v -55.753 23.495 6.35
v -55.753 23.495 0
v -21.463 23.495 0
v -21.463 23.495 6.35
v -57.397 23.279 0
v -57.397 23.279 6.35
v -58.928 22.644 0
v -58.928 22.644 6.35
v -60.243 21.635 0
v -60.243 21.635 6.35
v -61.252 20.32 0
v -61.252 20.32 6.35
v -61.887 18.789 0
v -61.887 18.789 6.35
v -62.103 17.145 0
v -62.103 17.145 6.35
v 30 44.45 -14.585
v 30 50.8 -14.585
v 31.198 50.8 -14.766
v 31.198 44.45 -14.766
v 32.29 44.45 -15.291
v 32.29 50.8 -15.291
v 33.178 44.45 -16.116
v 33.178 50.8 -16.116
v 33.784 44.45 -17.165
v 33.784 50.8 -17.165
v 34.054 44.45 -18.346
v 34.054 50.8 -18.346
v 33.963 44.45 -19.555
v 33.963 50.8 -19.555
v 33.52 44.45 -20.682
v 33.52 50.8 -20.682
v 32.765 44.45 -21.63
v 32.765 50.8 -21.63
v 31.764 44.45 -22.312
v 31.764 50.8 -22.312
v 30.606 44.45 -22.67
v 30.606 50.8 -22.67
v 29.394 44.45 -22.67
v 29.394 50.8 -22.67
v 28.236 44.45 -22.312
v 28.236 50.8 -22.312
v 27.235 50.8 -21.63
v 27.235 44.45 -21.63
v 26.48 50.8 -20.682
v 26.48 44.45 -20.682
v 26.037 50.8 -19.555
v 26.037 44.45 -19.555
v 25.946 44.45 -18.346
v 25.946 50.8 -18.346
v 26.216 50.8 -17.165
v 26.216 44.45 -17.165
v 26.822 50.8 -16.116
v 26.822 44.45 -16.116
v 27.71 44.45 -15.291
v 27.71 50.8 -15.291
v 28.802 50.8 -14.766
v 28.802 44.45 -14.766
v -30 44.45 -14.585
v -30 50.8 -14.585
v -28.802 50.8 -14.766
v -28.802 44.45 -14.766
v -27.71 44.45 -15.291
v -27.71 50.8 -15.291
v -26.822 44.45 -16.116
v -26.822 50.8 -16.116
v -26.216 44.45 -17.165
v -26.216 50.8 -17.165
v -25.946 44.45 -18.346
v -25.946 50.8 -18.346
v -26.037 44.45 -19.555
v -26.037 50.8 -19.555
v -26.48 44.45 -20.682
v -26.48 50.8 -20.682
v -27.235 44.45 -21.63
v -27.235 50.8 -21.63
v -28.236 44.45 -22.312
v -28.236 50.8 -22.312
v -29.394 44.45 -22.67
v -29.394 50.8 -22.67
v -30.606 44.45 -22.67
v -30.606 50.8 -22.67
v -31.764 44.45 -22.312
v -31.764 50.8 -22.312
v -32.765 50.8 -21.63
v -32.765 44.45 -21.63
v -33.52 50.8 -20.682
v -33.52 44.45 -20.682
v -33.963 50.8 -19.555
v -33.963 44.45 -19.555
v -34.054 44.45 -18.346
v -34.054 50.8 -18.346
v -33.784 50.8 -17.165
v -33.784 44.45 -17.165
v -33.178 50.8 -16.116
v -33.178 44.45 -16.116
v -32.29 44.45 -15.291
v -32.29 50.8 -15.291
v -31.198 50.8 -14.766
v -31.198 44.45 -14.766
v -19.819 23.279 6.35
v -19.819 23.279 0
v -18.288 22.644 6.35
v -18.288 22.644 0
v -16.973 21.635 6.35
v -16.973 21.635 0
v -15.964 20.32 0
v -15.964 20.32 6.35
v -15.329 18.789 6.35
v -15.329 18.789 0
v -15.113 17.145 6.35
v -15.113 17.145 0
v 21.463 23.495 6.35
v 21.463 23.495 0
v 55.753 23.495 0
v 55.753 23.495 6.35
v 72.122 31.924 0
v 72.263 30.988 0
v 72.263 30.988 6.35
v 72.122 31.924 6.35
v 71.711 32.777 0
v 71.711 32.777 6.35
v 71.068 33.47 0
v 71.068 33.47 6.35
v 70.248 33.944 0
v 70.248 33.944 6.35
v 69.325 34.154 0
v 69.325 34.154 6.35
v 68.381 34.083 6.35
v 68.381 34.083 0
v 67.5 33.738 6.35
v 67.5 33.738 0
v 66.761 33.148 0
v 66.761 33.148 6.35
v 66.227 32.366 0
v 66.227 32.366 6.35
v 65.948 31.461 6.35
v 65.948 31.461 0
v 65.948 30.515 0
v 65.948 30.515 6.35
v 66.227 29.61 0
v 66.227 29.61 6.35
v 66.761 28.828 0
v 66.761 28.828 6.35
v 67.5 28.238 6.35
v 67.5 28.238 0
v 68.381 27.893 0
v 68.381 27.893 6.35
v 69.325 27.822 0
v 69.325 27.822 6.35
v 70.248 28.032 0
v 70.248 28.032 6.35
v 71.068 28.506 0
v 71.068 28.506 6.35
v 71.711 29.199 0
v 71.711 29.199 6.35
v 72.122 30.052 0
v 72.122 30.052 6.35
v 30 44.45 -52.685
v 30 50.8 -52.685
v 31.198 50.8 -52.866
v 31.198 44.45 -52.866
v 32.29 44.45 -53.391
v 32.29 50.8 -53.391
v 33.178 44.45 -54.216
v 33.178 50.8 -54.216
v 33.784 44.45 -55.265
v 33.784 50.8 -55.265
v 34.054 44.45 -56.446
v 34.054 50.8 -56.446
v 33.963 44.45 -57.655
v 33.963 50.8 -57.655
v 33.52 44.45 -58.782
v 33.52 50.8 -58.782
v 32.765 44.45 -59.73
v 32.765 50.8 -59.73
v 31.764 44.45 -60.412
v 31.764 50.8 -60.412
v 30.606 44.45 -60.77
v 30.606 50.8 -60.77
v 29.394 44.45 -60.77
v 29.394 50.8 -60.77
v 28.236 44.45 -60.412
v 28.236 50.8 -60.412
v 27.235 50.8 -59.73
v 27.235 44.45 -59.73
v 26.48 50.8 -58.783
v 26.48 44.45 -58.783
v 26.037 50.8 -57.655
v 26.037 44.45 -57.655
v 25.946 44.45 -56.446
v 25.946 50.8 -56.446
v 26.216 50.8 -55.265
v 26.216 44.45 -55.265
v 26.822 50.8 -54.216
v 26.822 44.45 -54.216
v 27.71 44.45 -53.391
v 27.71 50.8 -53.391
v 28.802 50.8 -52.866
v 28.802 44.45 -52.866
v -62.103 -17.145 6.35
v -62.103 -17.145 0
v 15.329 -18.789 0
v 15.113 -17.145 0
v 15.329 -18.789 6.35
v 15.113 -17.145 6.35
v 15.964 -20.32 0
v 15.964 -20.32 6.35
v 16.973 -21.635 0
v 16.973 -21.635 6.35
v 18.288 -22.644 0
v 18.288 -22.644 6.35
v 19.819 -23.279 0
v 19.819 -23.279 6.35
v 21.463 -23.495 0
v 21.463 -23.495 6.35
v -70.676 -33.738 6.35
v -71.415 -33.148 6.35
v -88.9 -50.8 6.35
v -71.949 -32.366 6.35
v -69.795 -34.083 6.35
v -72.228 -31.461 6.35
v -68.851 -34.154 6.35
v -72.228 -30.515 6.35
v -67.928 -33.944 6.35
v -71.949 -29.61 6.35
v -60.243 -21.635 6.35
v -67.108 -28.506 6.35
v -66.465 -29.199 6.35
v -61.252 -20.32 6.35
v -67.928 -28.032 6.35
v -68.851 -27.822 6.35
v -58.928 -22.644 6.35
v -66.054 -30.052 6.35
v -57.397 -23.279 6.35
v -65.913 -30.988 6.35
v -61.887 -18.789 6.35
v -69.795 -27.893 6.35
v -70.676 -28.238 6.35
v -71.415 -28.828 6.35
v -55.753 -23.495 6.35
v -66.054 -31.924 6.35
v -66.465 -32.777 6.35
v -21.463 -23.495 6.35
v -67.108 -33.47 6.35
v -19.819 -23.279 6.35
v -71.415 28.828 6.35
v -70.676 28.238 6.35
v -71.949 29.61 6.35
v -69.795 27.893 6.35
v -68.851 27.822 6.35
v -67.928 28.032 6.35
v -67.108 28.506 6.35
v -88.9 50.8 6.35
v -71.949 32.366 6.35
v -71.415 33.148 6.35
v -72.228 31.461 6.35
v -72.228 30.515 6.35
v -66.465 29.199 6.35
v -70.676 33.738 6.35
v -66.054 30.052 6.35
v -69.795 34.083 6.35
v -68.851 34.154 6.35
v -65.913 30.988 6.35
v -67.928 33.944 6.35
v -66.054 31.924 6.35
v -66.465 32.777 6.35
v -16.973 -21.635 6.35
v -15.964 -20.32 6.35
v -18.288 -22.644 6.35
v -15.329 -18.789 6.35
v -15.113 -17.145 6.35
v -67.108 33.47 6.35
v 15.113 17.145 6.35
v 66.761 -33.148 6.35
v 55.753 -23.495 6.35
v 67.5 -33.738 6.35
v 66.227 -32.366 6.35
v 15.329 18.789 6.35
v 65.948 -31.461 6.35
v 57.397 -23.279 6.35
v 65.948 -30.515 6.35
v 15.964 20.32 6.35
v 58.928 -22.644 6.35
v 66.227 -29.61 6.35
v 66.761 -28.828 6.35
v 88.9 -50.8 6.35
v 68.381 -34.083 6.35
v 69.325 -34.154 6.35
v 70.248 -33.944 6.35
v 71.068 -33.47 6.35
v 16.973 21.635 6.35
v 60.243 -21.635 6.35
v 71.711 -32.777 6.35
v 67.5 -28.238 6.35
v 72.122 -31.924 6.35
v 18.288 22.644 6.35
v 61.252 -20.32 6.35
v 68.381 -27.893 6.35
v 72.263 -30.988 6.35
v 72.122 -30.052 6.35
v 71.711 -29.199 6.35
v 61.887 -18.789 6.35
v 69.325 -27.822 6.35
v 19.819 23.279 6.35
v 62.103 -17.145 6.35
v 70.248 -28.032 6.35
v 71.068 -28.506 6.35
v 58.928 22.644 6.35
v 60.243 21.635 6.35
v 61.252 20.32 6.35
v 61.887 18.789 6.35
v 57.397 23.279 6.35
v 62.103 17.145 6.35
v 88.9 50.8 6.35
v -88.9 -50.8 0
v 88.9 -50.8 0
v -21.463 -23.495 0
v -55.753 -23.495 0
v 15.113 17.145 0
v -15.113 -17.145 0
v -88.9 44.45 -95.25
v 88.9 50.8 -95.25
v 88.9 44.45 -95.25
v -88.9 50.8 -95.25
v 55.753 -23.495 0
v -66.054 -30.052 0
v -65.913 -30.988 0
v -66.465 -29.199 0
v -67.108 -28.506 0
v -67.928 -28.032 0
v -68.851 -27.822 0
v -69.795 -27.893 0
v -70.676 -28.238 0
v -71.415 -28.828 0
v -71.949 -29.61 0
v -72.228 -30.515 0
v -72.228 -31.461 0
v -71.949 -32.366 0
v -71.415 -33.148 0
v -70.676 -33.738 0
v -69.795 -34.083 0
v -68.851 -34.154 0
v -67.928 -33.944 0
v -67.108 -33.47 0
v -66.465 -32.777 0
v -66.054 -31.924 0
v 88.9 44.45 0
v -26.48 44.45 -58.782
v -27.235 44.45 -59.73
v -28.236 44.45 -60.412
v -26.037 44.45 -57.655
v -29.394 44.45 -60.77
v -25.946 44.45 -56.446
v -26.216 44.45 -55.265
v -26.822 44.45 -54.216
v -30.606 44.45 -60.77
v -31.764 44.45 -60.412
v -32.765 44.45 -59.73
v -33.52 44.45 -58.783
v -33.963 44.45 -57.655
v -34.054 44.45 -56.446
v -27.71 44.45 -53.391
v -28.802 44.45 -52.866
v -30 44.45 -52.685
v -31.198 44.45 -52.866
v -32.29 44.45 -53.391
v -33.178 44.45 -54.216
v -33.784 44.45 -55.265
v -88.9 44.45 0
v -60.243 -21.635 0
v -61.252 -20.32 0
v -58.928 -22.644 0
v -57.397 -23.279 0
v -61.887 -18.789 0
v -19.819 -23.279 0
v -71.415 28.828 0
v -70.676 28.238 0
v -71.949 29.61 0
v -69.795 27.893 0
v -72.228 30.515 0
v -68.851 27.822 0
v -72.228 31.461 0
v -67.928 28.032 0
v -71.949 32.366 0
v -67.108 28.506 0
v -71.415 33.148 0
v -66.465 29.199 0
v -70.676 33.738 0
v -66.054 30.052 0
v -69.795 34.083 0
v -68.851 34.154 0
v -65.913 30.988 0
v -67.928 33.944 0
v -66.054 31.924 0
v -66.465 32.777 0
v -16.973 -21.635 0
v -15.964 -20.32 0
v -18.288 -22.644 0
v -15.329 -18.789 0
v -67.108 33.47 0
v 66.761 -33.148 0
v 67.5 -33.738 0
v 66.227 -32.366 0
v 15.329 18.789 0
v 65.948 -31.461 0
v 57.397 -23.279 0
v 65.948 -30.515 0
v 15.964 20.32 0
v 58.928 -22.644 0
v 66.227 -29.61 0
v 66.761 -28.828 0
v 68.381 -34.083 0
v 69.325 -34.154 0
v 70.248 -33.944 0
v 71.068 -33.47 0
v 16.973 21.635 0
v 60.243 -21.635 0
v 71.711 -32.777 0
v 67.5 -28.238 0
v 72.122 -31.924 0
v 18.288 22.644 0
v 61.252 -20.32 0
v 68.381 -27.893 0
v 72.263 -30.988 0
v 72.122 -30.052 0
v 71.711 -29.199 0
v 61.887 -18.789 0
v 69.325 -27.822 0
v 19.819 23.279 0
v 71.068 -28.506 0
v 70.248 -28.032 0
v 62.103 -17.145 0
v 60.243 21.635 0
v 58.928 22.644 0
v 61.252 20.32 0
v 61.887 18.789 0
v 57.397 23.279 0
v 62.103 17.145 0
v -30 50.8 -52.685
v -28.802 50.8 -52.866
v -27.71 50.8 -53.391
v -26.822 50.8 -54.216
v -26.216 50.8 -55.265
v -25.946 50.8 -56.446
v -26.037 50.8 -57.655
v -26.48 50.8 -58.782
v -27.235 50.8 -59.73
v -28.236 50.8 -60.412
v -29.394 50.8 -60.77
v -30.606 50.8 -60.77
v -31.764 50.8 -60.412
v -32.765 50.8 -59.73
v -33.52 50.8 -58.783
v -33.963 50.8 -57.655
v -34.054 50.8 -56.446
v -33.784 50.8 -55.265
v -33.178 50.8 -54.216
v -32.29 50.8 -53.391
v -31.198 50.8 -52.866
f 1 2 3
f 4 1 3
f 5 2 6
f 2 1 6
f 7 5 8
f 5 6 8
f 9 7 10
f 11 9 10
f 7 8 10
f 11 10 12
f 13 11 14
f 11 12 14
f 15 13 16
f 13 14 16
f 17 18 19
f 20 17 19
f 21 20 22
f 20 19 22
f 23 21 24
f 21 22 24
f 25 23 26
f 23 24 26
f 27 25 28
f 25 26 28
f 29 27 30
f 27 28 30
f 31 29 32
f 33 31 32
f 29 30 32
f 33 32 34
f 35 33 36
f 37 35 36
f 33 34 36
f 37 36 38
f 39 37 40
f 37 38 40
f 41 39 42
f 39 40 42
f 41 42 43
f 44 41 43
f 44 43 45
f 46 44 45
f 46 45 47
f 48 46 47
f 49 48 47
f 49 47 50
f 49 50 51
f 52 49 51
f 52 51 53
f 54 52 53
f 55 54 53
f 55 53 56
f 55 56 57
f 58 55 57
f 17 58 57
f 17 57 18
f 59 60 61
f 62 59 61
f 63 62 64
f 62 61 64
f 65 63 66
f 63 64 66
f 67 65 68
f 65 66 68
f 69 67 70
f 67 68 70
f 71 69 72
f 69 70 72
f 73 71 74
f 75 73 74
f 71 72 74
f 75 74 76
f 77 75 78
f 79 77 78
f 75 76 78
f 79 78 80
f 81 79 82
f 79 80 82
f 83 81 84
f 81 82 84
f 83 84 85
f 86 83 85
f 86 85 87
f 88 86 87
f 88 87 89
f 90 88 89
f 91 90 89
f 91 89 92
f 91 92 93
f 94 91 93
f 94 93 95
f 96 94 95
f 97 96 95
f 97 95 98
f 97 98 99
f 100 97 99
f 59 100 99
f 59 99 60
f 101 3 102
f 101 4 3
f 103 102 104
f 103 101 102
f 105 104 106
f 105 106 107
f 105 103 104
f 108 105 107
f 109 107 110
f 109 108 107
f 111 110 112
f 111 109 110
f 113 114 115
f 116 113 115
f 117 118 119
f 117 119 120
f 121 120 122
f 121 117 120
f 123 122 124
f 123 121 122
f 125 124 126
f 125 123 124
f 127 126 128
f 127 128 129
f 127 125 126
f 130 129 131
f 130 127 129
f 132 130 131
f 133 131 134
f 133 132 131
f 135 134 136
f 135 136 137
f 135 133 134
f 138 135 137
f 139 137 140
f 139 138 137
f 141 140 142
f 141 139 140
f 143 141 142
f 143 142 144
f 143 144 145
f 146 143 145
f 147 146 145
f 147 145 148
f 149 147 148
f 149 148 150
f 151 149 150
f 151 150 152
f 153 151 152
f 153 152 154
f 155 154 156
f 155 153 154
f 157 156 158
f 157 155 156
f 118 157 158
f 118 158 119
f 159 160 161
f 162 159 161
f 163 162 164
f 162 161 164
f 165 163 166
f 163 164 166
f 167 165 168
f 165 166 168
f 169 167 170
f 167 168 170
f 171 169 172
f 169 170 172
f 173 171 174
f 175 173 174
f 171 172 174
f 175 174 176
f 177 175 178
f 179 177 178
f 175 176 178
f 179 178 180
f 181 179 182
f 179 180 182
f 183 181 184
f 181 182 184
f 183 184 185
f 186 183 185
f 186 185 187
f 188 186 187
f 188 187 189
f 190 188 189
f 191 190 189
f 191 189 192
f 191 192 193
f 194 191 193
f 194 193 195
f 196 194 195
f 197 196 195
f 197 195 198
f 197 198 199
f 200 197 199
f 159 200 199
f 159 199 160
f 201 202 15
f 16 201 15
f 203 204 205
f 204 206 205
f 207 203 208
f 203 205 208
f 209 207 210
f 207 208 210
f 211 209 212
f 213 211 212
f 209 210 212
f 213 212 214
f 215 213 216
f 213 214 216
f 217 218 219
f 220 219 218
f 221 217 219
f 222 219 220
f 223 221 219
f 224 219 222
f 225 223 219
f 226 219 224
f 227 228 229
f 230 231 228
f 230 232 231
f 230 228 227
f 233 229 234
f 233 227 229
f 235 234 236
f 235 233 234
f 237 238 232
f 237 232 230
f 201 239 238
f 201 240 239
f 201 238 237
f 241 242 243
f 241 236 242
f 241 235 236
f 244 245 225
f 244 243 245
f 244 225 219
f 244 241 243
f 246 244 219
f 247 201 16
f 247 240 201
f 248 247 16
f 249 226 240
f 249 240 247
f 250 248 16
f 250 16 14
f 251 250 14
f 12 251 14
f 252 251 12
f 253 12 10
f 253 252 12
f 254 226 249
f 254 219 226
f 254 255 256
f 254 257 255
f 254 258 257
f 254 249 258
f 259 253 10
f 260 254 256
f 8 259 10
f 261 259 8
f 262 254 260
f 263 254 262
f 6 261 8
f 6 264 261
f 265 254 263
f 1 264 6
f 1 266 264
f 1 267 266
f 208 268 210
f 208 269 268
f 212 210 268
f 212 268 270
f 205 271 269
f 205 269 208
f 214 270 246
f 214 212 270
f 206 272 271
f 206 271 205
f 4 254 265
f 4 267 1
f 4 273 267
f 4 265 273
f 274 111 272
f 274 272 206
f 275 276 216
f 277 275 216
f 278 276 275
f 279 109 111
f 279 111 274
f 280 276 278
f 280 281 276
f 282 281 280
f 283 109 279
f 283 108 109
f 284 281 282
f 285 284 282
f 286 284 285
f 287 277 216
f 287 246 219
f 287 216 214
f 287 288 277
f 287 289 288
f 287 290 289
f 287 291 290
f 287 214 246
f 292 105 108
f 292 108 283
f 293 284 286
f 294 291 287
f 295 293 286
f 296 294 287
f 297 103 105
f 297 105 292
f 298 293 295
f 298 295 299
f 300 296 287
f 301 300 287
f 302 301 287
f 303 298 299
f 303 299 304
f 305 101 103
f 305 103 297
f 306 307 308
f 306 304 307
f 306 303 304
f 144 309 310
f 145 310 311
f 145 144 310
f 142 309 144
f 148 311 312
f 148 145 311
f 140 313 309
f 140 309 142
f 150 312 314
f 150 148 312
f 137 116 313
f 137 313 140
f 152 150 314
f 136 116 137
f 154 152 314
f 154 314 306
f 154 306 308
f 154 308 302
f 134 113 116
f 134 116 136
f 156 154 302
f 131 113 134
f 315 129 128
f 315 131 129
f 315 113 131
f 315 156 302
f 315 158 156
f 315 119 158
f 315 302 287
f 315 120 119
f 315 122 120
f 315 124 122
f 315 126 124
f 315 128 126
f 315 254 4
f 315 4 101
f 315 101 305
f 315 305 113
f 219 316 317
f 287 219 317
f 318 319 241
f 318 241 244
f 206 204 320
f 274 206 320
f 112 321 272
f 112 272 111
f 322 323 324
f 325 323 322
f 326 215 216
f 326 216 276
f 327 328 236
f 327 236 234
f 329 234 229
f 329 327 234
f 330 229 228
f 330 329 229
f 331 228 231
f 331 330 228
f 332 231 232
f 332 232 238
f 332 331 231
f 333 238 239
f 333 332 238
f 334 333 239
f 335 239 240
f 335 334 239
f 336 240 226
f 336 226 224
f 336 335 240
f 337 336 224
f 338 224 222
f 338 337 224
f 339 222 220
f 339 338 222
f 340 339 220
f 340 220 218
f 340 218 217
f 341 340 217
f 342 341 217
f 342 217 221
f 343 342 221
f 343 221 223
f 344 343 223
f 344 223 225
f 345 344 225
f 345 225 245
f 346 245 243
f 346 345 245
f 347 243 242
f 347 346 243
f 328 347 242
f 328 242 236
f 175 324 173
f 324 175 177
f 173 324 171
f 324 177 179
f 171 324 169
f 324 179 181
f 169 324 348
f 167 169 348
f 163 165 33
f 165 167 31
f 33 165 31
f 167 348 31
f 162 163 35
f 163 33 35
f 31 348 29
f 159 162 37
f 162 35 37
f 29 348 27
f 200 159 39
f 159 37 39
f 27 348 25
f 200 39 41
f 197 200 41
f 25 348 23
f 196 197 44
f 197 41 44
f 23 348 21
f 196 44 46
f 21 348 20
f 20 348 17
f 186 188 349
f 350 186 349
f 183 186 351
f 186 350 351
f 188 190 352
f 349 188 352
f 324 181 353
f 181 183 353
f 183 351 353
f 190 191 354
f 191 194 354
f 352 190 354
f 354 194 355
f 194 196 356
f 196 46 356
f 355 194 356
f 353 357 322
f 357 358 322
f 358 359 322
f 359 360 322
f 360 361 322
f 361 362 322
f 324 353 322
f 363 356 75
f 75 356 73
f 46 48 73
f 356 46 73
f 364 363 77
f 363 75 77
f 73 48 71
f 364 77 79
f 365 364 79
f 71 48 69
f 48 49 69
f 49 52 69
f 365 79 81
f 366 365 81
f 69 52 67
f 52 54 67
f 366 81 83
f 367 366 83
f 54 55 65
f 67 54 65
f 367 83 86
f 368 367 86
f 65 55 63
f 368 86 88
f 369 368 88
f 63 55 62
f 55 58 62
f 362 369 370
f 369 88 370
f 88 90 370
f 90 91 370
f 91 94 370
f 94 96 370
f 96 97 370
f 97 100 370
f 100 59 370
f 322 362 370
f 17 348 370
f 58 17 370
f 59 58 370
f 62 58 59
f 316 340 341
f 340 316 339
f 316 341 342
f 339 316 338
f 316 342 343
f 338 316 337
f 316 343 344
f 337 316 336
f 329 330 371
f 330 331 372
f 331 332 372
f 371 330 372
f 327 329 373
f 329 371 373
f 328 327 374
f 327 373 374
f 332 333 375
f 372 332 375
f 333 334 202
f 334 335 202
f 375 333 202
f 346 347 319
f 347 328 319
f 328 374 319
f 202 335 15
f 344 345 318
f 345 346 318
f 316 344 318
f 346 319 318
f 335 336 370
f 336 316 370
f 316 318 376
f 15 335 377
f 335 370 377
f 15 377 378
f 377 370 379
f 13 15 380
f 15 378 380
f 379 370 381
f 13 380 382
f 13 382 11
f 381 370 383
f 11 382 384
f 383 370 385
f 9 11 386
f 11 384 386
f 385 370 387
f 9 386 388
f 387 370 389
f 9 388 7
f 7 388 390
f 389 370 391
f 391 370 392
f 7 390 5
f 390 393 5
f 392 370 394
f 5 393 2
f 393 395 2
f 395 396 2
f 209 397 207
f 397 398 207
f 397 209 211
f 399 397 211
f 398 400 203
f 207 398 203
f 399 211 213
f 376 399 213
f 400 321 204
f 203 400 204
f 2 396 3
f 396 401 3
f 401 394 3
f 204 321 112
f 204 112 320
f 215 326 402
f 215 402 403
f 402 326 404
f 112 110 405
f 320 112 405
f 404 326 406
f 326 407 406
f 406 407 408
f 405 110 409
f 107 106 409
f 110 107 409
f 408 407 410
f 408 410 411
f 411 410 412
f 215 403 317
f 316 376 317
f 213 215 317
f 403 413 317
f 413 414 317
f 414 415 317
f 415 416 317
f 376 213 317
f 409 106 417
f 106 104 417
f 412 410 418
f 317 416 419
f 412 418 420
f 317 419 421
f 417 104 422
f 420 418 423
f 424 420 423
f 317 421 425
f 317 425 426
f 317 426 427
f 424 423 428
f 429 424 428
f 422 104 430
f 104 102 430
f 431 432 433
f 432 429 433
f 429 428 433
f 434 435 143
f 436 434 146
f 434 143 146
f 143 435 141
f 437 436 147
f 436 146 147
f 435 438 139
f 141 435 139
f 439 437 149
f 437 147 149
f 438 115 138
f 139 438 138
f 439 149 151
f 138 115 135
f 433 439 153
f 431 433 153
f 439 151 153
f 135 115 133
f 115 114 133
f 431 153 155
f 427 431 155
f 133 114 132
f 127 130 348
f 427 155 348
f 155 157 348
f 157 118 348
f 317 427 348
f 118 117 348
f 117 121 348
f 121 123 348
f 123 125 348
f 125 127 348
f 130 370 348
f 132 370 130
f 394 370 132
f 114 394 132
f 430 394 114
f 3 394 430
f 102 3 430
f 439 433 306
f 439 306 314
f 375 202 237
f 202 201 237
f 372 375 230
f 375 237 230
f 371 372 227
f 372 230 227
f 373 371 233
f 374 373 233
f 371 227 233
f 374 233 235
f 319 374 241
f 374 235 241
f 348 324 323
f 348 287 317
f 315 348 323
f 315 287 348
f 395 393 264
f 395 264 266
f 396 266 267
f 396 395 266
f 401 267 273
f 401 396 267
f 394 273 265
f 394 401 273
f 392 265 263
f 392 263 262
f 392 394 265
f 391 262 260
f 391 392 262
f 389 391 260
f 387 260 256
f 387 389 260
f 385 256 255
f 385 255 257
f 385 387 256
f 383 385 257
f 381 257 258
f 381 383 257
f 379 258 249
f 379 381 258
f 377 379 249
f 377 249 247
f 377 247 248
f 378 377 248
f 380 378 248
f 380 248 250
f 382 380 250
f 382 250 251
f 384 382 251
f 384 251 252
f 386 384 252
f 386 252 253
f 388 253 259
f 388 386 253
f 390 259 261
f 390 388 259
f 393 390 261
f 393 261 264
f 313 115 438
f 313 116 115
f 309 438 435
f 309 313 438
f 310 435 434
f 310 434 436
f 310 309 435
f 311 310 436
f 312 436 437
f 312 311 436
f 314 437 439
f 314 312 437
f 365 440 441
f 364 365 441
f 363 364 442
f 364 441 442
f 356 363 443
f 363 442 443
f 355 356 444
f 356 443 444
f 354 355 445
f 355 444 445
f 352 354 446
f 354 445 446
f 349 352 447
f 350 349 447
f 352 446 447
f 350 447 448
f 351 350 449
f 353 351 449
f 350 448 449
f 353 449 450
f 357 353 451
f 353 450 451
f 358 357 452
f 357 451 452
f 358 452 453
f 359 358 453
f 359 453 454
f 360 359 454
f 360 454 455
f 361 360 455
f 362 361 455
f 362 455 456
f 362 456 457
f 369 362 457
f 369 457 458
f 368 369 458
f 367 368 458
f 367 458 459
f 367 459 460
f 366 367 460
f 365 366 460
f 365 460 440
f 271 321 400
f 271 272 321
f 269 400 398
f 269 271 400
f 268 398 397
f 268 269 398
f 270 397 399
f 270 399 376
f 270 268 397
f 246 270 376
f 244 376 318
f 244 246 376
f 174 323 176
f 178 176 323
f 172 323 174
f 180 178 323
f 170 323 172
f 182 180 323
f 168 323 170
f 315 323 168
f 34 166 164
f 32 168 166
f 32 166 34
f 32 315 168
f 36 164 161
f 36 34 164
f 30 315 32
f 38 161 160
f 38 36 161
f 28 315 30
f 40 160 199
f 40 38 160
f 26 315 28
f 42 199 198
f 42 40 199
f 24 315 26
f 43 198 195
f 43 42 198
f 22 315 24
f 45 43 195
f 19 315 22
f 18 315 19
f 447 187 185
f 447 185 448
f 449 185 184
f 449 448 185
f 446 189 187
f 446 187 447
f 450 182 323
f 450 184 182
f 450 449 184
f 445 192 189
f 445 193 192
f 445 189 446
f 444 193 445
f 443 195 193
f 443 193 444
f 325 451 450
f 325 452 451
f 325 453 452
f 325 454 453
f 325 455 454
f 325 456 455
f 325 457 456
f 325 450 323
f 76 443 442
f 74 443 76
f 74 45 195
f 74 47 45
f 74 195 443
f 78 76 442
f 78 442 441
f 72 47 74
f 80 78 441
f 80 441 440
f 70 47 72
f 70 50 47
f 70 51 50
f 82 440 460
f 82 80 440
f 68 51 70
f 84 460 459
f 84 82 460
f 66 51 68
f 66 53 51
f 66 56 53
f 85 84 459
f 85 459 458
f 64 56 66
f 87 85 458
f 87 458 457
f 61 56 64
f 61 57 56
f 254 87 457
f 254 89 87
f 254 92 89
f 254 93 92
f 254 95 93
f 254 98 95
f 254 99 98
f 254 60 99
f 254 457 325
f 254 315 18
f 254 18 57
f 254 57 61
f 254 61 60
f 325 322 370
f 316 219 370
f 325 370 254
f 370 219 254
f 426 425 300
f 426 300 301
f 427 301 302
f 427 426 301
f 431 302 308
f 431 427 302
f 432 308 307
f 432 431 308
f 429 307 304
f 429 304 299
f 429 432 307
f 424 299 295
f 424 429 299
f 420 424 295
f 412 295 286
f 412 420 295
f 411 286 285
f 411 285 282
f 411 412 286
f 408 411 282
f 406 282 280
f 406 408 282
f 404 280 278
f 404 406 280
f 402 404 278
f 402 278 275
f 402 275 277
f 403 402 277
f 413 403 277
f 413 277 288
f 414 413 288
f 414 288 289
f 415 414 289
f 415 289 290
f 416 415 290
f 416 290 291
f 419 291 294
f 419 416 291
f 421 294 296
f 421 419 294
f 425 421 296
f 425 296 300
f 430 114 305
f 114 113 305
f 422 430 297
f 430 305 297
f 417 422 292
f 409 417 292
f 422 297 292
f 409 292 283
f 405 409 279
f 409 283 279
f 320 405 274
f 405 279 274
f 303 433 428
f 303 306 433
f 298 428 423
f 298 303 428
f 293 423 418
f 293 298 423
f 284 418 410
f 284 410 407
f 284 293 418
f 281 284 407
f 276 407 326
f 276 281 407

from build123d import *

# Parameters (mm, degrees)
SKETCH1_W           = 177.8
SKETCH1_H           = 101.6
SKETCH1_R           = 3.175
SKETCH1_W_2         = 46.99
SKETCH1_H_2         = 46.99
BOSS_EXTRUDE2_DEPTH = 6.35
SKETCH2_W           = 177.8
SKETCH2_H           = 6.35
BOSS_EXTRUDE3_DEPTH = 95.25
FILLET1_R           = 6.35
SKETCH3_R           = 4.065
CUT_EXTRUDE1_DEPTH  = 152.4


with BuildPart() as part:
    # Sketch1 → Boss-Extrude2 (new body)
    with BuildSketch(Plane.XY):
        Rectangle(SKETCH1_W, SKETCH1_H)
        with Locations((-69.088, 30.988)):
            Circle(SKETCH1_R, mode=Mode.SUBTRACT)
        with Locations((69.088, 30.988)):
            Circle(SKETCH1_R, mode=Mode.SUBTRACT)
        with Locations((69.088, -30.988)):
            Circle(SKETCH1_R, mode=Mode.SUBTRACT)
        with Locations((-69.088, -30.988)):
            Circle(SKETCH1_R, mode=Mode.SUBTRACT)
        with Locations((-38.608, 0)):
            Rectangle(SKETCH1_W_2, SKETCH1_H_2, mode=Mode.SUBTRACT)
        with Locations((38.608, 0)):
            Rectangle(SKETCH1_W_2, SKETCH1_H_2, mode=Mode.SUBTRACT)
    extrude(amount=BOSS_EXTRUDE2_DEPTH)

    # Sketch2 → Boss-Extrude3 (add)
    with BuildSketch(Plane(origin=(0, 0, 0), x_dir=(-1, 0, 0), z_dir=(0, 0, -1))):
        with Locations((0, 47.625)):
            Rectangle(SKETCH2_W, SKETCH2_H)
    extrude(amount=BOSS_EXTRUDE3_DEPTH)

    # Fillet1
    fillet1_edges = [part.edges().sort_by_distance(p)[0] for p in [
        (15.113, 23.495, 3.175),
        (15.113, -23.495, 3.175),
        (62.103, -23.495, 3.175),
        (62.103, 23.495, 3.175),
        (-62.103, 23.495, 3.175),
        (-62.103, -23.495, 3.175),
        (-15.113, -23.495, 3.175),
        (-15.113, 23.495, 3.175),
    ]]
    fillet(fillet1_edges, radius=FILLET1_R)

    # Sketch3 → Cut-Extrude1 (cut)
    with BuildSketch(Plane(origin=(0, 50.8, 0), x_dir=(1, 0, 0), z_dir=(0, 1, 0))):
        with Locations(Location((-30, 18.65, 0), (0, 0, 270))):
            Circle(SKETCH3_R)
        with Locations(Location((-30, 56.75, 0), (0, 0, 270))):
            Circle(SKETCH3_R)
        with Locations(Location((30, 18.65, 0), (0, 0, 270))):
            Circle(SKETCH3_R)
        with Locations(Location((30, 56.75, 0), (0, 0, 270))):
            Circle(SKETCH3_R)
    extrude(amount=-CUT_EXTRUDE1_DEPTH, mode=Mode.SUBTRACT)


solid = part.part
